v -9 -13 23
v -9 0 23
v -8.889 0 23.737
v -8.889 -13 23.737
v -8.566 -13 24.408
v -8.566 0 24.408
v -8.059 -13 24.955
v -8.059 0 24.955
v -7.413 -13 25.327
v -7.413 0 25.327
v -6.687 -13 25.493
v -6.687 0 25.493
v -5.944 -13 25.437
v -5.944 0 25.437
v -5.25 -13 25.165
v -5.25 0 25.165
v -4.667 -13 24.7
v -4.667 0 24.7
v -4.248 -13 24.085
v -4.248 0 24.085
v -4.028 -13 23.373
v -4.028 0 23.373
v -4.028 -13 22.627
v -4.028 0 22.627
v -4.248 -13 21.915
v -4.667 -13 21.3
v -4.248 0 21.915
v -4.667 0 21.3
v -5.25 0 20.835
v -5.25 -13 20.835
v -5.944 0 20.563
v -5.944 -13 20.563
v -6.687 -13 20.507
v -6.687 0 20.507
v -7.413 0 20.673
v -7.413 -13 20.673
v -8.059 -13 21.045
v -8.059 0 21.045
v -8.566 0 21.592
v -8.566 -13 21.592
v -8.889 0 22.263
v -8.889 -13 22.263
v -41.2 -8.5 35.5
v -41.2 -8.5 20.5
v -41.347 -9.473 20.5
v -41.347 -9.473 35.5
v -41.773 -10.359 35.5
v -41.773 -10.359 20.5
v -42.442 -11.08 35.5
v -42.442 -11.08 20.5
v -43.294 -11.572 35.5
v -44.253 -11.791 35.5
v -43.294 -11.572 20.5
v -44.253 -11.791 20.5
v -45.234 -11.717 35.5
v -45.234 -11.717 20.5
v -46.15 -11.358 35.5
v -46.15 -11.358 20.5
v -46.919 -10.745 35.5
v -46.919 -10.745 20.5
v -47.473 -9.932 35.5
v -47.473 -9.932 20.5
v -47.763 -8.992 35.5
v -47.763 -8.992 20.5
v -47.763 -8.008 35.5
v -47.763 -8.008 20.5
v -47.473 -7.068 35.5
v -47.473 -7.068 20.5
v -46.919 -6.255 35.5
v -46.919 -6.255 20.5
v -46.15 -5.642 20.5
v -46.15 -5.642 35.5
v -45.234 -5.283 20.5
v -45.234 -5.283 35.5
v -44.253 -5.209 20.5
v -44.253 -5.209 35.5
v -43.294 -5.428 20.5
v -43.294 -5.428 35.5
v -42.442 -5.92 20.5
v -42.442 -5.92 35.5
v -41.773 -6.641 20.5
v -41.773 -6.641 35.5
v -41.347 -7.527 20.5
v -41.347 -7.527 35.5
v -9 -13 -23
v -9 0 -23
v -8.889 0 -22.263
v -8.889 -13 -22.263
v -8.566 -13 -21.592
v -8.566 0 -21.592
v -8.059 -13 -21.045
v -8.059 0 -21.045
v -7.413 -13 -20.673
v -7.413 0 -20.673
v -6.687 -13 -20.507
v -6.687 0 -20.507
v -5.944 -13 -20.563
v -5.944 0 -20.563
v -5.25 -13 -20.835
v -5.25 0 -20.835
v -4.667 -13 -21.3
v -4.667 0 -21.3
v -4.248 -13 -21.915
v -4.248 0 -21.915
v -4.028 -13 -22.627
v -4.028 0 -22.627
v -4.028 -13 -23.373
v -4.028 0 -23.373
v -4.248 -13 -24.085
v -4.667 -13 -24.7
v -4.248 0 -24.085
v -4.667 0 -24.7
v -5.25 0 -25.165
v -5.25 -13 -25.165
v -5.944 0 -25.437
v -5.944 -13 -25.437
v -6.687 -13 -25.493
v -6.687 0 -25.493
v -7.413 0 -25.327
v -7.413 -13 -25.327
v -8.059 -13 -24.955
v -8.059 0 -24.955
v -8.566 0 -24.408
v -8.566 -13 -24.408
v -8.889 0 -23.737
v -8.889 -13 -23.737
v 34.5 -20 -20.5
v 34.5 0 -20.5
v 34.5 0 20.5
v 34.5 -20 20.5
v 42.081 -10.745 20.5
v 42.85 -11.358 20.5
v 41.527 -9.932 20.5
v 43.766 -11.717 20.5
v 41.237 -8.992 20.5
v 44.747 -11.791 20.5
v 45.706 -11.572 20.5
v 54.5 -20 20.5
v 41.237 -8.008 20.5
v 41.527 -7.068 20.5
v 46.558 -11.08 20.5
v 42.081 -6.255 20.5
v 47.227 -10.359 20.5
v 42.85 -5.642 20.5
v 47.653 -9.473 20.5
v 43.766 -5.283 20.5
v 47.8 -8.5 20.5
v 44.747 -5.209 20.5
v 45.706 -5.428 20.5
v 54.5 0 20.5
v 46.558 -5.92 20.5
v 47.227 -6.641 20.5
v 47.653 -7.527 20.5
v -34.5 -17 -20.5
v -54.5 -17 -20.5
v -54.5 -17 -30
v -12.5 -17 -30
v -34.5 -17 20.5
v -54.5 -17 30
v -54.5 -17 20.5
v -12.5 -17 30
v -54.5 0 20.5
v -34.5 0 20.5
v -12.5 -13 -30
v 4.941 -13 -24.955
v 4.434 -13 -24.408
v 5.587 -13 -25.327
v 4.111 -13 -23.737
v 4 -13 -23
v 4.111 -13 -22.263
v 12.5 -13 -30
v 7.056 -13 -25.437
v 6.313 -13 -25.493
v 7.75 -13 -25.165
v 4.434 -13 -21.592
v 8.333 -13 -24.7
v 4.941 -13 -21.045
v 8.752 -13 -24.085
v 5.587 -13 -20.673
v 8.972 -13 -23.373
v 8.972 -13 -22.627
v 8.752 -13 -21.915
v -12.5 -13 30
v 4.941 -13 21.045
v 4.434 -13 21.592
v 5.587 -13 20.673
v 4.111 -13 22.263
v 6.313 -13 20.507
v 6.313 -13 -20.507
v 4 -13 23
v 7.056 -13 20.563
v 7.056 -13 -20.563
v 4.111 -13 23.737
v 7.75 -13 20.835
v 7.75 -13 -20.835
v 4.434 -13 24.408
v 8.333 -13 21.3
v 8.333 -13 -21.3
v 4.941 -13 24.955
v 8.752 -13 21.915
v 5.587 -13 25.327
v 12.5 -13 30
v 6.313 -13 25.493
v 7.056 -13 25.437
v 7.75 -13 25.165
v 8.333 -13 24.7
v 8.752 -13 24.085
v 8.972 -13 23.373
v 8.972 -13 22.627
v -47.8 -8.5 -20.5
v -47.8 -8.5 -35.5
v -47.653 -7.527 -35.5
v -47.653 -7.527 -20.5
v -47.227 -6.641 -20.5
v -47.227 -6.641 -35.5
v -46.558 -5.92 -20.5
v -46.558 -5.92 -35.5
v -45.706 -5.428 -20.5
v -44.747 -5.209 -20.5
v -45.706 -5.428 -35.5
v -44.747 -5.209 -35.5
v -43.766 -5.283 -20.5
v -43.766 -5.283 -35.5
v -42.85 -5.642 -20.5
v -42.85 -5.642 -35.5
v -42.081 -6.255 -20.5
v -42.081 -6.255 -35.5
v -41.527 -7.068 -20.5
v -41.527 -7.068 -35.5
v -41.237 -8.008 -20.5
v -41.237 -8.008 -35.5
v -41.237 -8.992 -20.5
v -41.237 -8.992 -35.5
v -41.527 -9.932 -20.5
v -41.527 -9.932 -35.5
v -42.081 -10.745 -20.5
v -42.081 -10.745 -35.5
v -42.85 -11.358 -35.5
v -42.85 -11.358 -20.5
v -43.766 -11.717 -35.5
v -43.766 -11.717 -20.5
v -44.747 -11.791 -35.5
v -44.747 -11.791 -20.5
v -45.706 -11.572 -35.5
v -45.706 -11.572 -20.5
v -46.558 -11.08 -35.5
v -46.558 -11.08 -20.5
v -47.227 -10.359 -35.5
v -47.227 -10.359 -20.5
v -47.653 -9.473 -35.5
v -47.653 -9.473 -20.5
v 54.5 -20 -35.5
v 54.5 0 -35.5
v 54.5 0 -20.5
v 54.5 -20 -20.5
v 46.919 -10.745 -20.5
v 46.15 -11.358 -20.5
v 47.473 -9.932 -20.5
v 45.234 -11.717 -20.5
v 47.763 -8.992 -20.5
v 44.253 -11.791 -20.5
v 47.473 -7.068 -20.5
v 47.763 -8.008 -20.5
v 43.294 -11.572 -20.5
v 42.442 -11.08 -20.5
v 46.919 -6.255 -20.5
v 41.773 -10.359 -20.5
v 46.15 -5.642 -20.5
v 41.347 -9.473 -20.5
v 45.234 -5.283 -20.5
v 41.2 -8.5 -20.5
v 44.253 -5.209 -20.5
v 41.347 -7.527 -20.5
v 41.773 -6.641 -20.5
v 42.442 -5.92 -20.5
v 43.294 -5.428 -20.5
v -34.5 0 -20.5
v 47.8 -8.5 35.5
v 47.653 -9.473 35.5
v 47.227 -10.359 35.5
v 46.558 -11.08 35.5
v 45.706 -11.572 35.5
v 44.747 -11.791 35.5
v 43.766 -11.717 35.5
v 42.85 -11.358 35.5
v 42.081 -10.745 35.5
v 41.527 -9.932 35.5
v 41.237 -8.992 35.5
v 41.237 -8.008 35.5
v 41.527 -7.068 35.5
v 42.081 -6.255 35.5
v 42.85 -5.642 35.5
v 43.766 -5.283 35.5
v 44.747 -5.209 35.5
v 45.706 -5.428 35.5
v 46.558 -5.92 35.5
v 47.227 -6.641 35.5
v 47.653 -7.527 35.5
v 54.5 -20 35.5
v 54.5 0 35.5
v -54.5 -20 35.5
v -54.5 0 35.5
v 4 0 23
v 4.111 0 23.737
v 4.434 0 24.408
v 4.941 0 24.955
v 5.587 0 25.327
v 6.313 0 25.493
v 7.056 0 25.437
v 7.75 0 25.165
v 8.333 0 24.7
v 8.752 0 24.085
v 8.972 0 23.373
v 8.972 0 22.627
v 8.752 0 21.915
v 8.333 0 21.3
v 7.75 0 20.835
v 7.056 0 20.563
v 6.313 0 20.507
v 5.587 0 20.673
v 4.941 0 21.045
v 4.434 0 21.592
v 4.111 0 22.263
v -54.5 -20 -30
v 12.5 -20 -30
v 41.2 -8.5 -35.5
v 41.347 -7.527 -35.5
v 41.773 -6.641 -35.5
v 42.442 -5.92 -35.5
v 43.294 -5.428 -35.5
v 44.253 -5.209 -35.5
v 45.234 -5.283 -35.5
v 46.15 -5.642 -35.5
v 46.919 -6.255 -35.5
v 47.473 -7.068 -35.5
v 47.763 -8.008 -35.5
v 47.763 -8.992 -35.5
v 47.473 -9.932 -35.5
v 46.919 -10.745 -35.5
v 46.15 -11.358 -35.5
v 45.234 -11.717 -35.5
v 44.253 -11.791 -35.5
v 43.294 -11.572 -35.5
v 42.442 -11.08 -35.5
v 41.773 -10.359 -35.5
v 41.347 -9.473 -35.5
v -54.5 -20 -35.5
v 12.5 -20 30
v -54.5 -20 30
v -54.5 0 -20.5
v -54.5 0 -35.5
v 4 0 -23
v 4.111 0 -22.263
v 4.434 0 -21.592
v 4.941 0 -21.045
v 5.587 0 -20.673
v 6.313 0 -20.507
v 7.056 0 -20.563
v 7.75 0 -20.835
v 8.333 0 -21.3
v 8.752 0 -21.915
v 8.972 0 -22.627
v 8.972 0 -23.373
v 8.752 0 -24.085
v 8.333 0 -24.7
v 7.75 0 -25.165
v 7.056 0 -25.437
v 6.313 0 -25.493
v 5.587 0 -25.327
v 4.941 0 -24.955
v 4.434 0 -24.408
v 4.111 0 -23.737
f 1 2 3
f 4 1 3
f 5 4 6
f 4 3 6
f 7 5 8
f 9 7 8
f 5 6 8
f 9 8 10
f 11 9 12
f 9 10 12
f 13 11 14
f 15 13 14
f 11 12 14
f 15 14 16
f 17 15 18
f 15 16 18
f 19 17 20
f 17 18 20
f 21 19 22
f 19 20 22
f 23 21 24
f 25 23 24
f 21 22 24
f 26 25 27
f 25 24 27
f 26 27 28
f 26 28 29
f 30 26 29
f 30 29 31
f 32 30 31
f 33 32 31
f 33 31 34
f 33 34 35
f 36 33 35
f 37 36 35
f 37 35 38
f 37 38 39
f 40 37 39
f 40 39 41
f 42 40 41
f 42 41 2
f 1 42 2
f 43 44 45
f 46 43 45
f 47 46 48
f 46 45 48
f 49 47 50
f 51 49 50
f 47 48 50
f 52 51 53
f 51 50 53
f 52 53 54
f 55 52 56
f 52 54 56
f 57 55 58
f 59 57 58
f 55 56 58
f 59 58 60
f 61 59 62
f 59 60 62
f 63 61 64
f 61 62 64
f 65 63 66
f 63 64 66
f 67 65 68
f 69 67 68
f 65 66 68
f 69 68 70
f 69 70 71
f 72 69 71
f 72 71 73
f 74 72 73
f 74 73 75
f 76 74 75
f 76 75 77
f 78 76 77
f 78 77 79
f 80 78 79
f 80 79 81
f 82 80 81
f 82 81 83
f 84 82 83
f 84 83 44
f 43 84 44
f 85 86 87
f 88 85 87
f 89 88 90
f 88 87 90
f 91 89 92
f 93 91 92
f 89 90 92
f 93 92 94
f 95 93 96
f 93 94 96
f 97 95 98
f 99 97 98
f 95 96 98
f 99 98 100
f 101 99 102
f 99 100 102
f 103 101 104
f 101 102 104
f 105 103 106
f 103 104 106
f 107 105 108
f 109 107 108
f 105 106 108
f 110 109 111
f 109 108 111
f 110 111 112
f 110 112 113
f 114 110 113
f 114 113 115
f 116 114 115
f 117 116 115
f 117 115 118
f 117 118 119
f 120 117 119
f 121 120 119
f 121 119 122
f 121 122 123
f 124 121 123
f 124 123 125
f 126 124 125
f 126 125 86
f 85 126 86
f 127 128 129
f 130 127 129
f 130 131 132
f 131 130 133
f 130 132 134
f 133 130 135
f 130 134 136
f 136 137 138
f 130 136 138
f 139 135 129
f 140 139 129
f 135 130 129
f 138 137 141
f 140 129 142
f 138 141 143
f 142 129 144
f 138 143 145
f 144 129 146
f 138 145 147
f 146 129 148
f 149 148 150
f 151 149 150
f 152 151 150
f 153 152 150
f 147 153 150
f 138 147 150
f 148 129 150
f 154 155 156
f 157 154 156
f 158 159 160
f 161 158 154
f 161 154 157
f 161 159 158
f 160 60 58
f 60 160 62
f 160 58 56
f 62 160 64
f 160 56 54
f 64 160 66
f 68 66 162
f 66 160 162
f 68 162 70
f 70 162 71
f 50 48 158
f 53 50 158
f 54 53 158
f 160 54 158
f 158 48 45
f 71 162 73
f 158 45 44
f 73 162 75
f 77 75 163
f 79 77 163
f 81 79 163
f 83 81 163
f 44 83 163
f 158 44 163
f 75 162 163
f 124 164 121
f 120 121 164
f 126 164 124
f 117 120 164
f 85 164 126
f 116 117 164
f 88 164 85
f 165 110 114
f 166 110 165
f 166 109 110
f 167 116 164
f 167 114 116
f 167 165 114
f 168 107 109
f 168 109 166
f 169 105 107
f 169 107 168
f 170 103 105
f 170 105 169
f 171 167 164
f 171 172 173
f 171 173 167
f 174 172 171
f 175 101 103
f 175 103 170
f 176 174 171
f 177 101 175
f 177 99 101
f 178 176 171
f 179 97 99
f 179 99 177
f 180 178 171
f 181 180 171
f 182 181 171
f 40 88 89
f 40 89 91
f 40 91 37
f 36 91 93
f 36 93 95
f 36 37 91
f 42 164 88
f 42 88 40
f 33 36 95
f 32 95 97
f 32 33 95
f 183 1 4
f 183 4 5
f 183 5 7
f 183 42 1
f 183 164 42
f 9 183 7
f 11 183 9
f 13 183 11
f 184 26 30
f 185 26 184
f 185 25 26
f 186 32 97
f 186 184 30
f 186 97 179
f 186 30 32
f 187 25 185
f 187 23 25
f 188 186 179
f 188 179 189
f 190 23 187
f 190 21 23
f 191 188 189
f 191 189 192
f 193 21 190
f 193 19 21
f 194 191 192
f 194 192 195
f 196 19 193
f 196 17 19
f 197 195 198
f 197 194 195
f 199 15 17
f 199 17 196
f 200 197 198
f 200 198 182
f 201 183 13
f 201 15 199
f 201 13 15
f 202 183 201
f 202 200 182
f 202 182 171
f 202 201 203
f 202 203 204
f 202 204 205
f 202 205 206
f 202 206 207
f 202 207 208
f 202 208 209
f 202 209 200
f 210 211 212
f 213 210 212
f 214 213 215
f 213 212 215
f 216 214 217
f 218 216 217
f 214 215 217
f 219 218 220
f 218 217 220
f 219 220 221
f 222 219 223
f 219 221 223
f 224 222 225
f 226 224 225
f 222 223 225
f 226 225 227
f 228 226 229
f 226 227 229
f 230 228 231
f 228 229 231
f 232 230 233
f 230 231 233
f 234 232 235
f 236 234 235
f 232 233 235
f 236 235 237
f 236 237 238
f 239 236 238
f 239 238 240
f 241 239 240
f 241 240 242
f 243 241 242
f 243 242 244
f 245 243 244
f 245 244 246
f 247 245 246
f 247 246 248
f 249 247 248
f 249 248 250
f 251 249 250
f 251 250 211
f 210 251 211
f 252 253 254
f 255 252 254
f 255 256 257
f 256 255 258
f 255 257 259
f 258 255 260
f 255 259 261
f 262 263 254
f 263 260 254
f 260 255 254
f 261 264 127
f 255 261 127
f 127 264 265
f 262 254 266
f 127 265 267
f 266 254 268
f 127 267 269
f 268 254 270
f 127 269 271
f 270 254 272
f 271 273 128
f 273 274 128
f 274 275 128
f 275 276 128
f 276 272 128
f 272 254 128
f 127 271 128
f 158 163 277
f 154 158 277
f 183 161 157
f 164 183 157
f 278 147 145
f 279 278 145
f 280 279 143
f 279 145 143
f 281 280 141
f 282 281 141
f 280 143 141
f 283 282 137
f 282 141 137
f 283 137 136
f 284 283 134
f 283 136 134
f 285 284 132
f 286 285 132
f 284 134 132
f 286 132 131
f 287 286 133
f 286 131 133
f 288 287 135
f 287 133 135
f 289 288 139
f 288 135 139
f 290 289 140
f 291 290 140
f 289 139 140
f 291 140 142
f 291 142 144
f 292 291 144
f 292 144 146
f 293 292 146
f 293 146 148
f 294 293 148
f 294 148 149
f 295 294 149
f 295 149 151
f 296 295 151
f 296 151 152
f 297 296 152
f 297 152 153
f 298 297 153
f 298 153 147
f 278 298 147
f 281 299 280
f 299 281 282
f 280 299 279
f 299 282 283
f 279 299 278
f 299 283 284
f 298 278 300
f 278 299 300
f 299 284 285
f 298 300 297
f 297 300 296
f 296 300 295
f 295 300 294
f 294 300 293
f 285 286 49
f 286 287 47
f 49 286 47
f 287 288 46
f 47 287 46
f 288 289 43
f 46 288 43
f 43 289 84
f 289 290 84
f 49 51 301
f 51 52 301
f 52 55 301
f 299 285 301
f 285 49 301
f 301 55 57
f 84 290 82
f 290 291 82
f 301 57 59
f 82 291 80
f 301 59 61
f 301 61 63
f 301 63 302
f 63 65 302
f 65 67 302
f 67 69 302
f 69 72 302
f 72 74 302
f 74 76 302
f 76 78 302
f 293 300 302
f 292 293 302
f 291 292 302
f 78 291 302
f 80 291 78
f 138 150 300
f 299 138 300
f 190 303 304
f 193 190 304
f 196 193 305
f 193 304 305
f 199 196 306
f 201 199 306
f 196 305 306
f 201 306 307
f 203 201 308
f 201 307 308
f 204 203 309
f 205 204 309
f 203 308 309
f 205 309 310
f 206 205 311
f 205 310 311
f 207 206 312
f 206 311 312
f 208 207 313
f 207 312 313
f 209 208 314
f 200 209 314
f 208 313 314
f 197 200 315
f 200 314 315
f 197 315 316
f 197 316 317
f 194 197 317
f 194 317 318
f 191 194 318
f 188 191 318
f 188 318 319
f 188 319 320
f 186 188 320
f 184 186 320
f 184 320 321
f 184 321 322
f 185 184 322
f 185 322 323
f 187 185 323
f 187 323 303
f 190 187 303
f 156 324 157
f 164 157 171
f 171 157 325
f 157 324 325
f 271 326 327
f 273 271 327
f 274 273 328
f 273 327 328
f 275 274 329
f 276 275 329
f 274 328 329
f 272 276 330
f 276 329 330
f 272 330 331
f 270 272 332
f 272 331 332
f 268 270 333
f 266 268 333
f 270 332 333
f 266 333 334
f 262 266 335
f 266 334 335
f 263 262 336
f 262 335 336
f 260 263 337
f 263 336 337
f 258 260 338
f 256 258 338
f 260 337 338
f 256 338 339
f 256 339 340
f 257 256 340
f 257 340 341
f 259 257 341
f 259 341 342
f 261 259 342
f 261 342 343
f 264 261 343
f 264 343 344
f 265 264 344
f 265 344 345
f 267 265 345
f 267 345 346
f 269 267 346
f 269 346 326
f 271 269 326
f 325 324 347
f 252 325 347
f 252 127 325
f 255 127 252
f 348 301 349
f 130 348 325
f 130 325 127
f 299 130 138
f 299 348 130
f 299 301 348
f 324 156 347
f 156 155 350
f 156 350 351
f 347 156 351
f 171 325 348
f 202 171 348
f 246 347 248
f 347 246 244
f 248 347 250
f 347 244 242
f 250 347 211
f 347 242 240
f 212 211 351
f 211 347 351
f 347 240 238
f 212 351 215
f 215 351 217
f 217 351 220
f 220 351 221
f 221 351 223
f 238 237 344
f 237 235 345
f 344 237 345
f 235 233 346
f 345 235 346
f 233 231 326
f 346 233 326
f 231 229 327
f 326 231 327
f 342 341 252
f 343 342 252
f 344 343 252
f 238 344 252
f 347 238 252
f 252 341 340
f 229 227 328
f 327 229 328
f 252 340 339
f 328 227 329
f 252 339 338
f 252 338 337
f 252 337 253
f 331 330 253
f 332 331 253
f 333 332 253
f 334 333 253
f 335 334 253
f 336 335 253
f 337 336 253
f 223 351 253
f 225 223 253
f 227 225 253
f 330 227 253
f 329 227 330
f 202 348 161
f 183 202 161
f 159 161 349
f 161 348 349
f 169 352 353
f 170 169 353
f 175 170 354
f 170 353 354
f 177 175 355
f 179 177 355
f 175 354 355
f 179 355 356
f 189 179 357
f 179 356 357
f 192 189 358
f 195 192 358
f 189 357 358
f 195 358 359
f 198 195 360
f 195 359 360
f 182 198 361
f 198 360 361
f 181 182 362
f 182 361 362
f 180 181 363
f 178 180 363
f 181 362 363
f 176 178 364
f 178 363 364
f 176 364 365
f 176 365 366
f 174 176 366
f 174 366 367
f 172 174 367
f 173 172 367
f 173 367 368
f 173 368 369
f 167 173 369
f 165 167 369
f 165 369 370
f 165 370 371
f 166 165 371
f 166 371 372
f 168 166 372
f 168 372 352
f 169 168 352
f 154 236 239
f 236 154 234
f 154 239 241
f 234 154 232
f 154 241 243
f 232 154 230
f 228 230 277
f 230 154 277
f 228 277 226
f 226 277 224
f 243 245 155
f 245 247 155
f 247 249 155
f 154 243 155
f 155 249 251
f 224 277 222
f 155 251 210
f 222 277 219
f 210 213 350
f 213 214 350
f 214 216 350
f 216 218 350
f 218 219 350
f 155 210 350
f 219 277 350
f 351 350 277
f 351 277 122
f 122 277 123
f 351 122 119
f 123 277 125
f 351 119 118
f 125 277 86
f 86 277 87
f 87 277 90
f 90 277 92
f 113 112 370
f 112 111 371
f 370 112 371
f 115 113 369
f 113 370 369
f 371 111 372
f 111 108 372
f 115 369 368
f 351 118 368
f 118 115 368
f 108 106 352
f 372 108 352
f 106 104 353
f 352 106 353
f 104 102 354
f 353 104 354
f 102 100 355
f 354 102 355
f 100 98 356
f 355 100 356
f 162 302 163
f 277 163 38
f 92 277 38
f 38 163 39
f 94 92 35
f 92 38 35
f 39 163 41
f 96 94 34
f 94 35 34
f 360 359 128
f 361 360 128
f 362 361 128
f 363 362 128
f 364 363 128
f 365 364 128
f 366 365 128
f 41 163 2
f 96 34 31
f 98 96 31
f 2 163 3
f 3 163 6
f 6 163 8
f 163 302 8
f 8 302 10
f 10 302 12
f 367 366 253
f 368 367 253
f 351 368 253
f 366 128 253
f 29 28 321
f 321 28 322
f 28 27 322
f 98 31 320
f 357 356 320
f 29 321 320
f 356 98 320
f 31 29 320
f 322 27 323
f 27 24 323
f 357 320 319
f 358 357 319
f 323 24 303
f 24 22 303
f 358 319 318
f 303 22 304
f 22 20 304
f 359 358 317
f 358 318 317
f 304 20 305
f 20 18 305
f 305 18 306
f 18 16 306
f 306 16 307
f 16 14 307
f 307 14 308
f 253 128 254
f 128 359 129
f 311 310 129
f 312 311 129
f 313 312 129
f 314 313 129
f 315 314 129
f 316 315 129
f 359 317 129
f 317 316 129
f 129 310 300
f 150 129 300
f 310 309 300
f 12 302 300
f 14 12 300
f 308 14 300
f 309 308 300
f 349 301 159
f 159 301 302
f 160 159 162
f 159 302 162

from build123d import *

# Parameters (mm, degrees)
F1_DEPTH = 20
F3_DEPTH = 7
F4_DEPTH = 3
F6_D     = 6.6
F6_DEPTH = 15.001
F8_D     = 6.6
F9_D     = 5


with BuildPart() as f1:
    # F0 (on Front) → F1 (new body)
    with BuildSketch(Plane.XZ):
        Polygon((54.5, 35.5), (-54.5, 35.5), (-54.5, 20.5), (-34.5, 20.5), (-34.5, 0), (-34.5, -20.5), (-54.5, -20.5), (-54.5, -35.5), (54.5, -35.5), (54.5, -20.5), (34.5, -20.5), (34.5, 0), (34.5, 20.5), (54.5, 20.5), align=None)
    extrude(amount=F1_DEPTH)

    # F2 (on face) → F3 (cut)
    with BuildSketch(Plane.XZ.offset(20)):
        Polygon((0, 30), (-12.5, 30), (-12.5, 0), (-12.5, -30), (0, -30), (12.5, -30), (12.5, 0), (12.5, 30), align=None)
    extrude(amount=-F3_DEPTH, mode=Mode.SUBTRACT)

    # F2 (on face) → F4 (cut)
    with BuildSketch(Plane.XZ.offset(20)):
        Polygon((-12.5, 0), (-12.5, 30), (-54.5, 30), (-54.5, 20.5), (-34.5, 20.5), (-34.5, -20.5), (-54.5, -20.5), (-54.5, -30), (-12.5, -30), align=None)
    extrude(amount=-F4_DEPTH, mode=Mode.SUBTRACT)

    # F6 (through all, one way)
    with BuildSketch(Plane(origin=(0, 0, 20.5), x_dir=(1, 0, 0), z_dir=(0, 0, -1))):
        with Locations((-44.5, 8.5), (44.5, 8.5)):
            Circle(F6_D / 2)
    extrude(amount=-F6_DEPTH, mode=Mode.SUBTRACT)

    # F8 (through all)
    with Locations(Plane.XY.offset(-20.5)):
        with Locations((-44.5, -8.5), (44.5, -8.5)):
            Hole(F8_D / 2)

    # F9 (through all)
    with Locations(Plane.XZ.offset(20)):
        with Locations((-6.5, 23), (-6.5, -23), (6.5, -23), (6.5, 23)):
            Hole(F9_D / 2)


solid = f1.part
